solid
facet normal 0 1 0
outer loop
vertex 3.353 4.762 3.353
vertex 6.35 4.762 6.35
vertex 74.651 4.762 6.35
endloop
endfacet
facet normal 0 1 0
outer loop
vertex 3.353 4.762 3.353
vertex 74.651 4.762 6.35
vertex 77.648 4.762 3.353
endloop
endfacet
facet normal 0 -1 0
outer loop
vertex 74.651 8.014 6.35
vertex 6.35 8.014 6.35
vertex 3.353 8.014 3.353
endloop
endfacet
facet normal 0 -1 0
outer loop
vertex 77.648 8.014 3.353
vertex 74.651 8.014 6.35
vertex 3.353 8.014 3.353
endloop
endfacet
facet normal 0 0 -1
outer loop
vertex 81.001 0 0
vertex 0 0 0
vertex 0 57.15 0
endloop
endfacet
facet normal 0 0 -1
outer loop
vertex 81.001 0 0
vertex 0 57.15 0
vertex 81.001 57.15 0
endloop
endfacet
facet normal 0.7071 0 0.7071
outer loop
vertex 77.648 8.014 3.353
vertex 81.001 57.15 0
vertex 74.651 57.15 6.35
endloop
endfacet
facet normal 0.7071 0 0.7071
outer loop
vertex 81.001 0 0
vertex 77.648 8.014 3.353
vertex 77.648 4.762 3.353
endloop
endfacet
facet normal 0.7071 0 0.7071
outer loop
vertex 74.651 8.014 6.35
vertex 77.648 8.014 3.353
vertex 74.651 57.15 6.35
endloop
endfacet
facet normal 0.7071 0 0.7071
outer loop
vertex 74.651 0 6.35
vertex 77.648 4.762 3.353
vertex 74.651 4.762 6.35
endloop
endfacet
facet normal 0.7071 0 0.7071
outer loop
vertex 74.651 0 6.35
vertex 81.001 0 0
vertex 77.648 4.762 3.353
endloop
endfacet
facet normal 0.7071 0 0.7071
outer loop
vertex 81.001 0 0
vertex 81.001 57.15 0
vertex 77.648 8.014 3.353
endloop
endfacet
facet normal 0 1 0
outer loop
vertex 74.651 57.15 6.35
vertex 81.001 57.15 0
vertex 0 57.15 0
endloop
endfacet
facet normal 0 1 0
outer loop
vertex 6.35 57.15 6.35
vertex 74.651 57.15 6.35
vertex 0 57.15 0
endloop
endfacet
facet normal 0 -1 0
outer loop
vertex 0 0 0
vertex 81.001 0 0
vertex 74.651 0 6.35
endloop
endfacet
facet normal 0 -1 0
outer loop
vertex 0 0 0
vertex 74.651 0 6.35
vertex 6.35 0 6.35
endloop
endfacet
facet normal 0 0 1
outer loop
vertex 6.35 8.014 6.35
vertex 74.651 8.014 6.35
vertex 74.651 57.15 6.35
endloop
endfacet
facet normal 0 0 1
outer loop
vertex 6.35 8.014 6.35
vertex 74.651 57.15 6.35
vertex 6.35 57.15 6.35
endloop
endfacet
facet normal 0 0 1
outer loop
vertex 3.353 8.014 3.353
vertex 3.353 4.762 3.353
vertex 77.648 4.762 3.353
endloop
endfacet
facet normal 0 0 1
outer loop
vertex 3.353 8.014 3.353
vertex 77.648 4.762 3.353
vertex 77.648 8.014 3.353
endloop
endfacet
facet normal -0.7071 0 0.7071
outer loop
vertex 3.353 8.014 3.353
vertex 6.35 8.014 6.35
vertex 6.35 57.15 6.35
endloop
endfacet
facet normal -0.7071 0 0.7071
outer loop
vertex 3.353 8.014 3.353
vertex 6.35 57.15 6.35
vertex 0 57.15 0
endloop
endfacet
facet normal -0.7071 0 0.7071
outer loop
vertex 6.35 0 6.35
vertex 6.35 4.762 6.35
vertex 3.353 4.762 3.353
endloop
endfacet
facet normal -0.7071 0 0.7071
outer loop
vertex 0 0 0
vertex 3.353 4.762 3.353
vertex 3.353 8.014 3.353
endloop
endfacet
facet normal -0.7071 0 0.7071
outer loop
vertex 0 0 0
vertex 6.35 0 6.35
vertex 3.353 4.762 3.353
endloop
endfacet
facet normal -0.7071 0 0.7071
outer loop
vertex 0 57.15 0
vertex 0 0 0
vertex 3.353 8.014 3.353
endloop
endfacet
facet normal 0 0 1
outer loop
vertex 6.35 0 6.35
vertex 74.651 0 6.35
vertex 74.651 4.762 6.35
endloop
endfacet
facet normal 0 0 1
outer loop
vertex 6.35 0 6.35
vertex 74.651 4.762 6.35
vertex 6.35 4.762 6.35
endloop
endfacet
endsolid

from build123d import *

# Parameters (mm, degrees)
BOSS_EXTRUDE1_DEPTH     = 57.15
SKETCH2_W               = 2.9972
SKETCH2_H               = 3.2512
CUT_EXTRUDE1_DEPTH      = 82.0006
CUT_EXTRUDE1_DEPTH_BACK = 1


with BuildPart() as part:
    # Sketch1 → Boss-Extrude1 (new body)
    with BuildSketch(Plane(origin=(0, 0, 0), x_dir=(1, 0, 0), z_dir=(0, 1, 0))):
        Polygon((0, 0), (81.0006, 0), (74.6506, -6.35), (6.35, -6.35), align=None)
    extrude(amount=BOSS_EXTRUDE1_DEPTH)

    # Sketch2 → Cut-Extrude1 (cut, two sides)
    with BuildSketch(Plane(origin=(0, 0, 0), x_dir=(0, 0, -1), z_dir=(1, 0, 0))) as cut_extrude1_sk:
        with Locations((-4.8514, 6.3881)):
            Rectangle(SKETCH2_W, SKETCH2_H)
    extrude(amount=CUT_EXTRUDE1_DEPTH, mode=Mode.SUBTRACT)
    extrude(cut_extrude1_sk.sketch, amount=-CUT_EXTRUDE1_DEPTH_BACK, mode=Mode.SUBTRACT)


solid = part.part
